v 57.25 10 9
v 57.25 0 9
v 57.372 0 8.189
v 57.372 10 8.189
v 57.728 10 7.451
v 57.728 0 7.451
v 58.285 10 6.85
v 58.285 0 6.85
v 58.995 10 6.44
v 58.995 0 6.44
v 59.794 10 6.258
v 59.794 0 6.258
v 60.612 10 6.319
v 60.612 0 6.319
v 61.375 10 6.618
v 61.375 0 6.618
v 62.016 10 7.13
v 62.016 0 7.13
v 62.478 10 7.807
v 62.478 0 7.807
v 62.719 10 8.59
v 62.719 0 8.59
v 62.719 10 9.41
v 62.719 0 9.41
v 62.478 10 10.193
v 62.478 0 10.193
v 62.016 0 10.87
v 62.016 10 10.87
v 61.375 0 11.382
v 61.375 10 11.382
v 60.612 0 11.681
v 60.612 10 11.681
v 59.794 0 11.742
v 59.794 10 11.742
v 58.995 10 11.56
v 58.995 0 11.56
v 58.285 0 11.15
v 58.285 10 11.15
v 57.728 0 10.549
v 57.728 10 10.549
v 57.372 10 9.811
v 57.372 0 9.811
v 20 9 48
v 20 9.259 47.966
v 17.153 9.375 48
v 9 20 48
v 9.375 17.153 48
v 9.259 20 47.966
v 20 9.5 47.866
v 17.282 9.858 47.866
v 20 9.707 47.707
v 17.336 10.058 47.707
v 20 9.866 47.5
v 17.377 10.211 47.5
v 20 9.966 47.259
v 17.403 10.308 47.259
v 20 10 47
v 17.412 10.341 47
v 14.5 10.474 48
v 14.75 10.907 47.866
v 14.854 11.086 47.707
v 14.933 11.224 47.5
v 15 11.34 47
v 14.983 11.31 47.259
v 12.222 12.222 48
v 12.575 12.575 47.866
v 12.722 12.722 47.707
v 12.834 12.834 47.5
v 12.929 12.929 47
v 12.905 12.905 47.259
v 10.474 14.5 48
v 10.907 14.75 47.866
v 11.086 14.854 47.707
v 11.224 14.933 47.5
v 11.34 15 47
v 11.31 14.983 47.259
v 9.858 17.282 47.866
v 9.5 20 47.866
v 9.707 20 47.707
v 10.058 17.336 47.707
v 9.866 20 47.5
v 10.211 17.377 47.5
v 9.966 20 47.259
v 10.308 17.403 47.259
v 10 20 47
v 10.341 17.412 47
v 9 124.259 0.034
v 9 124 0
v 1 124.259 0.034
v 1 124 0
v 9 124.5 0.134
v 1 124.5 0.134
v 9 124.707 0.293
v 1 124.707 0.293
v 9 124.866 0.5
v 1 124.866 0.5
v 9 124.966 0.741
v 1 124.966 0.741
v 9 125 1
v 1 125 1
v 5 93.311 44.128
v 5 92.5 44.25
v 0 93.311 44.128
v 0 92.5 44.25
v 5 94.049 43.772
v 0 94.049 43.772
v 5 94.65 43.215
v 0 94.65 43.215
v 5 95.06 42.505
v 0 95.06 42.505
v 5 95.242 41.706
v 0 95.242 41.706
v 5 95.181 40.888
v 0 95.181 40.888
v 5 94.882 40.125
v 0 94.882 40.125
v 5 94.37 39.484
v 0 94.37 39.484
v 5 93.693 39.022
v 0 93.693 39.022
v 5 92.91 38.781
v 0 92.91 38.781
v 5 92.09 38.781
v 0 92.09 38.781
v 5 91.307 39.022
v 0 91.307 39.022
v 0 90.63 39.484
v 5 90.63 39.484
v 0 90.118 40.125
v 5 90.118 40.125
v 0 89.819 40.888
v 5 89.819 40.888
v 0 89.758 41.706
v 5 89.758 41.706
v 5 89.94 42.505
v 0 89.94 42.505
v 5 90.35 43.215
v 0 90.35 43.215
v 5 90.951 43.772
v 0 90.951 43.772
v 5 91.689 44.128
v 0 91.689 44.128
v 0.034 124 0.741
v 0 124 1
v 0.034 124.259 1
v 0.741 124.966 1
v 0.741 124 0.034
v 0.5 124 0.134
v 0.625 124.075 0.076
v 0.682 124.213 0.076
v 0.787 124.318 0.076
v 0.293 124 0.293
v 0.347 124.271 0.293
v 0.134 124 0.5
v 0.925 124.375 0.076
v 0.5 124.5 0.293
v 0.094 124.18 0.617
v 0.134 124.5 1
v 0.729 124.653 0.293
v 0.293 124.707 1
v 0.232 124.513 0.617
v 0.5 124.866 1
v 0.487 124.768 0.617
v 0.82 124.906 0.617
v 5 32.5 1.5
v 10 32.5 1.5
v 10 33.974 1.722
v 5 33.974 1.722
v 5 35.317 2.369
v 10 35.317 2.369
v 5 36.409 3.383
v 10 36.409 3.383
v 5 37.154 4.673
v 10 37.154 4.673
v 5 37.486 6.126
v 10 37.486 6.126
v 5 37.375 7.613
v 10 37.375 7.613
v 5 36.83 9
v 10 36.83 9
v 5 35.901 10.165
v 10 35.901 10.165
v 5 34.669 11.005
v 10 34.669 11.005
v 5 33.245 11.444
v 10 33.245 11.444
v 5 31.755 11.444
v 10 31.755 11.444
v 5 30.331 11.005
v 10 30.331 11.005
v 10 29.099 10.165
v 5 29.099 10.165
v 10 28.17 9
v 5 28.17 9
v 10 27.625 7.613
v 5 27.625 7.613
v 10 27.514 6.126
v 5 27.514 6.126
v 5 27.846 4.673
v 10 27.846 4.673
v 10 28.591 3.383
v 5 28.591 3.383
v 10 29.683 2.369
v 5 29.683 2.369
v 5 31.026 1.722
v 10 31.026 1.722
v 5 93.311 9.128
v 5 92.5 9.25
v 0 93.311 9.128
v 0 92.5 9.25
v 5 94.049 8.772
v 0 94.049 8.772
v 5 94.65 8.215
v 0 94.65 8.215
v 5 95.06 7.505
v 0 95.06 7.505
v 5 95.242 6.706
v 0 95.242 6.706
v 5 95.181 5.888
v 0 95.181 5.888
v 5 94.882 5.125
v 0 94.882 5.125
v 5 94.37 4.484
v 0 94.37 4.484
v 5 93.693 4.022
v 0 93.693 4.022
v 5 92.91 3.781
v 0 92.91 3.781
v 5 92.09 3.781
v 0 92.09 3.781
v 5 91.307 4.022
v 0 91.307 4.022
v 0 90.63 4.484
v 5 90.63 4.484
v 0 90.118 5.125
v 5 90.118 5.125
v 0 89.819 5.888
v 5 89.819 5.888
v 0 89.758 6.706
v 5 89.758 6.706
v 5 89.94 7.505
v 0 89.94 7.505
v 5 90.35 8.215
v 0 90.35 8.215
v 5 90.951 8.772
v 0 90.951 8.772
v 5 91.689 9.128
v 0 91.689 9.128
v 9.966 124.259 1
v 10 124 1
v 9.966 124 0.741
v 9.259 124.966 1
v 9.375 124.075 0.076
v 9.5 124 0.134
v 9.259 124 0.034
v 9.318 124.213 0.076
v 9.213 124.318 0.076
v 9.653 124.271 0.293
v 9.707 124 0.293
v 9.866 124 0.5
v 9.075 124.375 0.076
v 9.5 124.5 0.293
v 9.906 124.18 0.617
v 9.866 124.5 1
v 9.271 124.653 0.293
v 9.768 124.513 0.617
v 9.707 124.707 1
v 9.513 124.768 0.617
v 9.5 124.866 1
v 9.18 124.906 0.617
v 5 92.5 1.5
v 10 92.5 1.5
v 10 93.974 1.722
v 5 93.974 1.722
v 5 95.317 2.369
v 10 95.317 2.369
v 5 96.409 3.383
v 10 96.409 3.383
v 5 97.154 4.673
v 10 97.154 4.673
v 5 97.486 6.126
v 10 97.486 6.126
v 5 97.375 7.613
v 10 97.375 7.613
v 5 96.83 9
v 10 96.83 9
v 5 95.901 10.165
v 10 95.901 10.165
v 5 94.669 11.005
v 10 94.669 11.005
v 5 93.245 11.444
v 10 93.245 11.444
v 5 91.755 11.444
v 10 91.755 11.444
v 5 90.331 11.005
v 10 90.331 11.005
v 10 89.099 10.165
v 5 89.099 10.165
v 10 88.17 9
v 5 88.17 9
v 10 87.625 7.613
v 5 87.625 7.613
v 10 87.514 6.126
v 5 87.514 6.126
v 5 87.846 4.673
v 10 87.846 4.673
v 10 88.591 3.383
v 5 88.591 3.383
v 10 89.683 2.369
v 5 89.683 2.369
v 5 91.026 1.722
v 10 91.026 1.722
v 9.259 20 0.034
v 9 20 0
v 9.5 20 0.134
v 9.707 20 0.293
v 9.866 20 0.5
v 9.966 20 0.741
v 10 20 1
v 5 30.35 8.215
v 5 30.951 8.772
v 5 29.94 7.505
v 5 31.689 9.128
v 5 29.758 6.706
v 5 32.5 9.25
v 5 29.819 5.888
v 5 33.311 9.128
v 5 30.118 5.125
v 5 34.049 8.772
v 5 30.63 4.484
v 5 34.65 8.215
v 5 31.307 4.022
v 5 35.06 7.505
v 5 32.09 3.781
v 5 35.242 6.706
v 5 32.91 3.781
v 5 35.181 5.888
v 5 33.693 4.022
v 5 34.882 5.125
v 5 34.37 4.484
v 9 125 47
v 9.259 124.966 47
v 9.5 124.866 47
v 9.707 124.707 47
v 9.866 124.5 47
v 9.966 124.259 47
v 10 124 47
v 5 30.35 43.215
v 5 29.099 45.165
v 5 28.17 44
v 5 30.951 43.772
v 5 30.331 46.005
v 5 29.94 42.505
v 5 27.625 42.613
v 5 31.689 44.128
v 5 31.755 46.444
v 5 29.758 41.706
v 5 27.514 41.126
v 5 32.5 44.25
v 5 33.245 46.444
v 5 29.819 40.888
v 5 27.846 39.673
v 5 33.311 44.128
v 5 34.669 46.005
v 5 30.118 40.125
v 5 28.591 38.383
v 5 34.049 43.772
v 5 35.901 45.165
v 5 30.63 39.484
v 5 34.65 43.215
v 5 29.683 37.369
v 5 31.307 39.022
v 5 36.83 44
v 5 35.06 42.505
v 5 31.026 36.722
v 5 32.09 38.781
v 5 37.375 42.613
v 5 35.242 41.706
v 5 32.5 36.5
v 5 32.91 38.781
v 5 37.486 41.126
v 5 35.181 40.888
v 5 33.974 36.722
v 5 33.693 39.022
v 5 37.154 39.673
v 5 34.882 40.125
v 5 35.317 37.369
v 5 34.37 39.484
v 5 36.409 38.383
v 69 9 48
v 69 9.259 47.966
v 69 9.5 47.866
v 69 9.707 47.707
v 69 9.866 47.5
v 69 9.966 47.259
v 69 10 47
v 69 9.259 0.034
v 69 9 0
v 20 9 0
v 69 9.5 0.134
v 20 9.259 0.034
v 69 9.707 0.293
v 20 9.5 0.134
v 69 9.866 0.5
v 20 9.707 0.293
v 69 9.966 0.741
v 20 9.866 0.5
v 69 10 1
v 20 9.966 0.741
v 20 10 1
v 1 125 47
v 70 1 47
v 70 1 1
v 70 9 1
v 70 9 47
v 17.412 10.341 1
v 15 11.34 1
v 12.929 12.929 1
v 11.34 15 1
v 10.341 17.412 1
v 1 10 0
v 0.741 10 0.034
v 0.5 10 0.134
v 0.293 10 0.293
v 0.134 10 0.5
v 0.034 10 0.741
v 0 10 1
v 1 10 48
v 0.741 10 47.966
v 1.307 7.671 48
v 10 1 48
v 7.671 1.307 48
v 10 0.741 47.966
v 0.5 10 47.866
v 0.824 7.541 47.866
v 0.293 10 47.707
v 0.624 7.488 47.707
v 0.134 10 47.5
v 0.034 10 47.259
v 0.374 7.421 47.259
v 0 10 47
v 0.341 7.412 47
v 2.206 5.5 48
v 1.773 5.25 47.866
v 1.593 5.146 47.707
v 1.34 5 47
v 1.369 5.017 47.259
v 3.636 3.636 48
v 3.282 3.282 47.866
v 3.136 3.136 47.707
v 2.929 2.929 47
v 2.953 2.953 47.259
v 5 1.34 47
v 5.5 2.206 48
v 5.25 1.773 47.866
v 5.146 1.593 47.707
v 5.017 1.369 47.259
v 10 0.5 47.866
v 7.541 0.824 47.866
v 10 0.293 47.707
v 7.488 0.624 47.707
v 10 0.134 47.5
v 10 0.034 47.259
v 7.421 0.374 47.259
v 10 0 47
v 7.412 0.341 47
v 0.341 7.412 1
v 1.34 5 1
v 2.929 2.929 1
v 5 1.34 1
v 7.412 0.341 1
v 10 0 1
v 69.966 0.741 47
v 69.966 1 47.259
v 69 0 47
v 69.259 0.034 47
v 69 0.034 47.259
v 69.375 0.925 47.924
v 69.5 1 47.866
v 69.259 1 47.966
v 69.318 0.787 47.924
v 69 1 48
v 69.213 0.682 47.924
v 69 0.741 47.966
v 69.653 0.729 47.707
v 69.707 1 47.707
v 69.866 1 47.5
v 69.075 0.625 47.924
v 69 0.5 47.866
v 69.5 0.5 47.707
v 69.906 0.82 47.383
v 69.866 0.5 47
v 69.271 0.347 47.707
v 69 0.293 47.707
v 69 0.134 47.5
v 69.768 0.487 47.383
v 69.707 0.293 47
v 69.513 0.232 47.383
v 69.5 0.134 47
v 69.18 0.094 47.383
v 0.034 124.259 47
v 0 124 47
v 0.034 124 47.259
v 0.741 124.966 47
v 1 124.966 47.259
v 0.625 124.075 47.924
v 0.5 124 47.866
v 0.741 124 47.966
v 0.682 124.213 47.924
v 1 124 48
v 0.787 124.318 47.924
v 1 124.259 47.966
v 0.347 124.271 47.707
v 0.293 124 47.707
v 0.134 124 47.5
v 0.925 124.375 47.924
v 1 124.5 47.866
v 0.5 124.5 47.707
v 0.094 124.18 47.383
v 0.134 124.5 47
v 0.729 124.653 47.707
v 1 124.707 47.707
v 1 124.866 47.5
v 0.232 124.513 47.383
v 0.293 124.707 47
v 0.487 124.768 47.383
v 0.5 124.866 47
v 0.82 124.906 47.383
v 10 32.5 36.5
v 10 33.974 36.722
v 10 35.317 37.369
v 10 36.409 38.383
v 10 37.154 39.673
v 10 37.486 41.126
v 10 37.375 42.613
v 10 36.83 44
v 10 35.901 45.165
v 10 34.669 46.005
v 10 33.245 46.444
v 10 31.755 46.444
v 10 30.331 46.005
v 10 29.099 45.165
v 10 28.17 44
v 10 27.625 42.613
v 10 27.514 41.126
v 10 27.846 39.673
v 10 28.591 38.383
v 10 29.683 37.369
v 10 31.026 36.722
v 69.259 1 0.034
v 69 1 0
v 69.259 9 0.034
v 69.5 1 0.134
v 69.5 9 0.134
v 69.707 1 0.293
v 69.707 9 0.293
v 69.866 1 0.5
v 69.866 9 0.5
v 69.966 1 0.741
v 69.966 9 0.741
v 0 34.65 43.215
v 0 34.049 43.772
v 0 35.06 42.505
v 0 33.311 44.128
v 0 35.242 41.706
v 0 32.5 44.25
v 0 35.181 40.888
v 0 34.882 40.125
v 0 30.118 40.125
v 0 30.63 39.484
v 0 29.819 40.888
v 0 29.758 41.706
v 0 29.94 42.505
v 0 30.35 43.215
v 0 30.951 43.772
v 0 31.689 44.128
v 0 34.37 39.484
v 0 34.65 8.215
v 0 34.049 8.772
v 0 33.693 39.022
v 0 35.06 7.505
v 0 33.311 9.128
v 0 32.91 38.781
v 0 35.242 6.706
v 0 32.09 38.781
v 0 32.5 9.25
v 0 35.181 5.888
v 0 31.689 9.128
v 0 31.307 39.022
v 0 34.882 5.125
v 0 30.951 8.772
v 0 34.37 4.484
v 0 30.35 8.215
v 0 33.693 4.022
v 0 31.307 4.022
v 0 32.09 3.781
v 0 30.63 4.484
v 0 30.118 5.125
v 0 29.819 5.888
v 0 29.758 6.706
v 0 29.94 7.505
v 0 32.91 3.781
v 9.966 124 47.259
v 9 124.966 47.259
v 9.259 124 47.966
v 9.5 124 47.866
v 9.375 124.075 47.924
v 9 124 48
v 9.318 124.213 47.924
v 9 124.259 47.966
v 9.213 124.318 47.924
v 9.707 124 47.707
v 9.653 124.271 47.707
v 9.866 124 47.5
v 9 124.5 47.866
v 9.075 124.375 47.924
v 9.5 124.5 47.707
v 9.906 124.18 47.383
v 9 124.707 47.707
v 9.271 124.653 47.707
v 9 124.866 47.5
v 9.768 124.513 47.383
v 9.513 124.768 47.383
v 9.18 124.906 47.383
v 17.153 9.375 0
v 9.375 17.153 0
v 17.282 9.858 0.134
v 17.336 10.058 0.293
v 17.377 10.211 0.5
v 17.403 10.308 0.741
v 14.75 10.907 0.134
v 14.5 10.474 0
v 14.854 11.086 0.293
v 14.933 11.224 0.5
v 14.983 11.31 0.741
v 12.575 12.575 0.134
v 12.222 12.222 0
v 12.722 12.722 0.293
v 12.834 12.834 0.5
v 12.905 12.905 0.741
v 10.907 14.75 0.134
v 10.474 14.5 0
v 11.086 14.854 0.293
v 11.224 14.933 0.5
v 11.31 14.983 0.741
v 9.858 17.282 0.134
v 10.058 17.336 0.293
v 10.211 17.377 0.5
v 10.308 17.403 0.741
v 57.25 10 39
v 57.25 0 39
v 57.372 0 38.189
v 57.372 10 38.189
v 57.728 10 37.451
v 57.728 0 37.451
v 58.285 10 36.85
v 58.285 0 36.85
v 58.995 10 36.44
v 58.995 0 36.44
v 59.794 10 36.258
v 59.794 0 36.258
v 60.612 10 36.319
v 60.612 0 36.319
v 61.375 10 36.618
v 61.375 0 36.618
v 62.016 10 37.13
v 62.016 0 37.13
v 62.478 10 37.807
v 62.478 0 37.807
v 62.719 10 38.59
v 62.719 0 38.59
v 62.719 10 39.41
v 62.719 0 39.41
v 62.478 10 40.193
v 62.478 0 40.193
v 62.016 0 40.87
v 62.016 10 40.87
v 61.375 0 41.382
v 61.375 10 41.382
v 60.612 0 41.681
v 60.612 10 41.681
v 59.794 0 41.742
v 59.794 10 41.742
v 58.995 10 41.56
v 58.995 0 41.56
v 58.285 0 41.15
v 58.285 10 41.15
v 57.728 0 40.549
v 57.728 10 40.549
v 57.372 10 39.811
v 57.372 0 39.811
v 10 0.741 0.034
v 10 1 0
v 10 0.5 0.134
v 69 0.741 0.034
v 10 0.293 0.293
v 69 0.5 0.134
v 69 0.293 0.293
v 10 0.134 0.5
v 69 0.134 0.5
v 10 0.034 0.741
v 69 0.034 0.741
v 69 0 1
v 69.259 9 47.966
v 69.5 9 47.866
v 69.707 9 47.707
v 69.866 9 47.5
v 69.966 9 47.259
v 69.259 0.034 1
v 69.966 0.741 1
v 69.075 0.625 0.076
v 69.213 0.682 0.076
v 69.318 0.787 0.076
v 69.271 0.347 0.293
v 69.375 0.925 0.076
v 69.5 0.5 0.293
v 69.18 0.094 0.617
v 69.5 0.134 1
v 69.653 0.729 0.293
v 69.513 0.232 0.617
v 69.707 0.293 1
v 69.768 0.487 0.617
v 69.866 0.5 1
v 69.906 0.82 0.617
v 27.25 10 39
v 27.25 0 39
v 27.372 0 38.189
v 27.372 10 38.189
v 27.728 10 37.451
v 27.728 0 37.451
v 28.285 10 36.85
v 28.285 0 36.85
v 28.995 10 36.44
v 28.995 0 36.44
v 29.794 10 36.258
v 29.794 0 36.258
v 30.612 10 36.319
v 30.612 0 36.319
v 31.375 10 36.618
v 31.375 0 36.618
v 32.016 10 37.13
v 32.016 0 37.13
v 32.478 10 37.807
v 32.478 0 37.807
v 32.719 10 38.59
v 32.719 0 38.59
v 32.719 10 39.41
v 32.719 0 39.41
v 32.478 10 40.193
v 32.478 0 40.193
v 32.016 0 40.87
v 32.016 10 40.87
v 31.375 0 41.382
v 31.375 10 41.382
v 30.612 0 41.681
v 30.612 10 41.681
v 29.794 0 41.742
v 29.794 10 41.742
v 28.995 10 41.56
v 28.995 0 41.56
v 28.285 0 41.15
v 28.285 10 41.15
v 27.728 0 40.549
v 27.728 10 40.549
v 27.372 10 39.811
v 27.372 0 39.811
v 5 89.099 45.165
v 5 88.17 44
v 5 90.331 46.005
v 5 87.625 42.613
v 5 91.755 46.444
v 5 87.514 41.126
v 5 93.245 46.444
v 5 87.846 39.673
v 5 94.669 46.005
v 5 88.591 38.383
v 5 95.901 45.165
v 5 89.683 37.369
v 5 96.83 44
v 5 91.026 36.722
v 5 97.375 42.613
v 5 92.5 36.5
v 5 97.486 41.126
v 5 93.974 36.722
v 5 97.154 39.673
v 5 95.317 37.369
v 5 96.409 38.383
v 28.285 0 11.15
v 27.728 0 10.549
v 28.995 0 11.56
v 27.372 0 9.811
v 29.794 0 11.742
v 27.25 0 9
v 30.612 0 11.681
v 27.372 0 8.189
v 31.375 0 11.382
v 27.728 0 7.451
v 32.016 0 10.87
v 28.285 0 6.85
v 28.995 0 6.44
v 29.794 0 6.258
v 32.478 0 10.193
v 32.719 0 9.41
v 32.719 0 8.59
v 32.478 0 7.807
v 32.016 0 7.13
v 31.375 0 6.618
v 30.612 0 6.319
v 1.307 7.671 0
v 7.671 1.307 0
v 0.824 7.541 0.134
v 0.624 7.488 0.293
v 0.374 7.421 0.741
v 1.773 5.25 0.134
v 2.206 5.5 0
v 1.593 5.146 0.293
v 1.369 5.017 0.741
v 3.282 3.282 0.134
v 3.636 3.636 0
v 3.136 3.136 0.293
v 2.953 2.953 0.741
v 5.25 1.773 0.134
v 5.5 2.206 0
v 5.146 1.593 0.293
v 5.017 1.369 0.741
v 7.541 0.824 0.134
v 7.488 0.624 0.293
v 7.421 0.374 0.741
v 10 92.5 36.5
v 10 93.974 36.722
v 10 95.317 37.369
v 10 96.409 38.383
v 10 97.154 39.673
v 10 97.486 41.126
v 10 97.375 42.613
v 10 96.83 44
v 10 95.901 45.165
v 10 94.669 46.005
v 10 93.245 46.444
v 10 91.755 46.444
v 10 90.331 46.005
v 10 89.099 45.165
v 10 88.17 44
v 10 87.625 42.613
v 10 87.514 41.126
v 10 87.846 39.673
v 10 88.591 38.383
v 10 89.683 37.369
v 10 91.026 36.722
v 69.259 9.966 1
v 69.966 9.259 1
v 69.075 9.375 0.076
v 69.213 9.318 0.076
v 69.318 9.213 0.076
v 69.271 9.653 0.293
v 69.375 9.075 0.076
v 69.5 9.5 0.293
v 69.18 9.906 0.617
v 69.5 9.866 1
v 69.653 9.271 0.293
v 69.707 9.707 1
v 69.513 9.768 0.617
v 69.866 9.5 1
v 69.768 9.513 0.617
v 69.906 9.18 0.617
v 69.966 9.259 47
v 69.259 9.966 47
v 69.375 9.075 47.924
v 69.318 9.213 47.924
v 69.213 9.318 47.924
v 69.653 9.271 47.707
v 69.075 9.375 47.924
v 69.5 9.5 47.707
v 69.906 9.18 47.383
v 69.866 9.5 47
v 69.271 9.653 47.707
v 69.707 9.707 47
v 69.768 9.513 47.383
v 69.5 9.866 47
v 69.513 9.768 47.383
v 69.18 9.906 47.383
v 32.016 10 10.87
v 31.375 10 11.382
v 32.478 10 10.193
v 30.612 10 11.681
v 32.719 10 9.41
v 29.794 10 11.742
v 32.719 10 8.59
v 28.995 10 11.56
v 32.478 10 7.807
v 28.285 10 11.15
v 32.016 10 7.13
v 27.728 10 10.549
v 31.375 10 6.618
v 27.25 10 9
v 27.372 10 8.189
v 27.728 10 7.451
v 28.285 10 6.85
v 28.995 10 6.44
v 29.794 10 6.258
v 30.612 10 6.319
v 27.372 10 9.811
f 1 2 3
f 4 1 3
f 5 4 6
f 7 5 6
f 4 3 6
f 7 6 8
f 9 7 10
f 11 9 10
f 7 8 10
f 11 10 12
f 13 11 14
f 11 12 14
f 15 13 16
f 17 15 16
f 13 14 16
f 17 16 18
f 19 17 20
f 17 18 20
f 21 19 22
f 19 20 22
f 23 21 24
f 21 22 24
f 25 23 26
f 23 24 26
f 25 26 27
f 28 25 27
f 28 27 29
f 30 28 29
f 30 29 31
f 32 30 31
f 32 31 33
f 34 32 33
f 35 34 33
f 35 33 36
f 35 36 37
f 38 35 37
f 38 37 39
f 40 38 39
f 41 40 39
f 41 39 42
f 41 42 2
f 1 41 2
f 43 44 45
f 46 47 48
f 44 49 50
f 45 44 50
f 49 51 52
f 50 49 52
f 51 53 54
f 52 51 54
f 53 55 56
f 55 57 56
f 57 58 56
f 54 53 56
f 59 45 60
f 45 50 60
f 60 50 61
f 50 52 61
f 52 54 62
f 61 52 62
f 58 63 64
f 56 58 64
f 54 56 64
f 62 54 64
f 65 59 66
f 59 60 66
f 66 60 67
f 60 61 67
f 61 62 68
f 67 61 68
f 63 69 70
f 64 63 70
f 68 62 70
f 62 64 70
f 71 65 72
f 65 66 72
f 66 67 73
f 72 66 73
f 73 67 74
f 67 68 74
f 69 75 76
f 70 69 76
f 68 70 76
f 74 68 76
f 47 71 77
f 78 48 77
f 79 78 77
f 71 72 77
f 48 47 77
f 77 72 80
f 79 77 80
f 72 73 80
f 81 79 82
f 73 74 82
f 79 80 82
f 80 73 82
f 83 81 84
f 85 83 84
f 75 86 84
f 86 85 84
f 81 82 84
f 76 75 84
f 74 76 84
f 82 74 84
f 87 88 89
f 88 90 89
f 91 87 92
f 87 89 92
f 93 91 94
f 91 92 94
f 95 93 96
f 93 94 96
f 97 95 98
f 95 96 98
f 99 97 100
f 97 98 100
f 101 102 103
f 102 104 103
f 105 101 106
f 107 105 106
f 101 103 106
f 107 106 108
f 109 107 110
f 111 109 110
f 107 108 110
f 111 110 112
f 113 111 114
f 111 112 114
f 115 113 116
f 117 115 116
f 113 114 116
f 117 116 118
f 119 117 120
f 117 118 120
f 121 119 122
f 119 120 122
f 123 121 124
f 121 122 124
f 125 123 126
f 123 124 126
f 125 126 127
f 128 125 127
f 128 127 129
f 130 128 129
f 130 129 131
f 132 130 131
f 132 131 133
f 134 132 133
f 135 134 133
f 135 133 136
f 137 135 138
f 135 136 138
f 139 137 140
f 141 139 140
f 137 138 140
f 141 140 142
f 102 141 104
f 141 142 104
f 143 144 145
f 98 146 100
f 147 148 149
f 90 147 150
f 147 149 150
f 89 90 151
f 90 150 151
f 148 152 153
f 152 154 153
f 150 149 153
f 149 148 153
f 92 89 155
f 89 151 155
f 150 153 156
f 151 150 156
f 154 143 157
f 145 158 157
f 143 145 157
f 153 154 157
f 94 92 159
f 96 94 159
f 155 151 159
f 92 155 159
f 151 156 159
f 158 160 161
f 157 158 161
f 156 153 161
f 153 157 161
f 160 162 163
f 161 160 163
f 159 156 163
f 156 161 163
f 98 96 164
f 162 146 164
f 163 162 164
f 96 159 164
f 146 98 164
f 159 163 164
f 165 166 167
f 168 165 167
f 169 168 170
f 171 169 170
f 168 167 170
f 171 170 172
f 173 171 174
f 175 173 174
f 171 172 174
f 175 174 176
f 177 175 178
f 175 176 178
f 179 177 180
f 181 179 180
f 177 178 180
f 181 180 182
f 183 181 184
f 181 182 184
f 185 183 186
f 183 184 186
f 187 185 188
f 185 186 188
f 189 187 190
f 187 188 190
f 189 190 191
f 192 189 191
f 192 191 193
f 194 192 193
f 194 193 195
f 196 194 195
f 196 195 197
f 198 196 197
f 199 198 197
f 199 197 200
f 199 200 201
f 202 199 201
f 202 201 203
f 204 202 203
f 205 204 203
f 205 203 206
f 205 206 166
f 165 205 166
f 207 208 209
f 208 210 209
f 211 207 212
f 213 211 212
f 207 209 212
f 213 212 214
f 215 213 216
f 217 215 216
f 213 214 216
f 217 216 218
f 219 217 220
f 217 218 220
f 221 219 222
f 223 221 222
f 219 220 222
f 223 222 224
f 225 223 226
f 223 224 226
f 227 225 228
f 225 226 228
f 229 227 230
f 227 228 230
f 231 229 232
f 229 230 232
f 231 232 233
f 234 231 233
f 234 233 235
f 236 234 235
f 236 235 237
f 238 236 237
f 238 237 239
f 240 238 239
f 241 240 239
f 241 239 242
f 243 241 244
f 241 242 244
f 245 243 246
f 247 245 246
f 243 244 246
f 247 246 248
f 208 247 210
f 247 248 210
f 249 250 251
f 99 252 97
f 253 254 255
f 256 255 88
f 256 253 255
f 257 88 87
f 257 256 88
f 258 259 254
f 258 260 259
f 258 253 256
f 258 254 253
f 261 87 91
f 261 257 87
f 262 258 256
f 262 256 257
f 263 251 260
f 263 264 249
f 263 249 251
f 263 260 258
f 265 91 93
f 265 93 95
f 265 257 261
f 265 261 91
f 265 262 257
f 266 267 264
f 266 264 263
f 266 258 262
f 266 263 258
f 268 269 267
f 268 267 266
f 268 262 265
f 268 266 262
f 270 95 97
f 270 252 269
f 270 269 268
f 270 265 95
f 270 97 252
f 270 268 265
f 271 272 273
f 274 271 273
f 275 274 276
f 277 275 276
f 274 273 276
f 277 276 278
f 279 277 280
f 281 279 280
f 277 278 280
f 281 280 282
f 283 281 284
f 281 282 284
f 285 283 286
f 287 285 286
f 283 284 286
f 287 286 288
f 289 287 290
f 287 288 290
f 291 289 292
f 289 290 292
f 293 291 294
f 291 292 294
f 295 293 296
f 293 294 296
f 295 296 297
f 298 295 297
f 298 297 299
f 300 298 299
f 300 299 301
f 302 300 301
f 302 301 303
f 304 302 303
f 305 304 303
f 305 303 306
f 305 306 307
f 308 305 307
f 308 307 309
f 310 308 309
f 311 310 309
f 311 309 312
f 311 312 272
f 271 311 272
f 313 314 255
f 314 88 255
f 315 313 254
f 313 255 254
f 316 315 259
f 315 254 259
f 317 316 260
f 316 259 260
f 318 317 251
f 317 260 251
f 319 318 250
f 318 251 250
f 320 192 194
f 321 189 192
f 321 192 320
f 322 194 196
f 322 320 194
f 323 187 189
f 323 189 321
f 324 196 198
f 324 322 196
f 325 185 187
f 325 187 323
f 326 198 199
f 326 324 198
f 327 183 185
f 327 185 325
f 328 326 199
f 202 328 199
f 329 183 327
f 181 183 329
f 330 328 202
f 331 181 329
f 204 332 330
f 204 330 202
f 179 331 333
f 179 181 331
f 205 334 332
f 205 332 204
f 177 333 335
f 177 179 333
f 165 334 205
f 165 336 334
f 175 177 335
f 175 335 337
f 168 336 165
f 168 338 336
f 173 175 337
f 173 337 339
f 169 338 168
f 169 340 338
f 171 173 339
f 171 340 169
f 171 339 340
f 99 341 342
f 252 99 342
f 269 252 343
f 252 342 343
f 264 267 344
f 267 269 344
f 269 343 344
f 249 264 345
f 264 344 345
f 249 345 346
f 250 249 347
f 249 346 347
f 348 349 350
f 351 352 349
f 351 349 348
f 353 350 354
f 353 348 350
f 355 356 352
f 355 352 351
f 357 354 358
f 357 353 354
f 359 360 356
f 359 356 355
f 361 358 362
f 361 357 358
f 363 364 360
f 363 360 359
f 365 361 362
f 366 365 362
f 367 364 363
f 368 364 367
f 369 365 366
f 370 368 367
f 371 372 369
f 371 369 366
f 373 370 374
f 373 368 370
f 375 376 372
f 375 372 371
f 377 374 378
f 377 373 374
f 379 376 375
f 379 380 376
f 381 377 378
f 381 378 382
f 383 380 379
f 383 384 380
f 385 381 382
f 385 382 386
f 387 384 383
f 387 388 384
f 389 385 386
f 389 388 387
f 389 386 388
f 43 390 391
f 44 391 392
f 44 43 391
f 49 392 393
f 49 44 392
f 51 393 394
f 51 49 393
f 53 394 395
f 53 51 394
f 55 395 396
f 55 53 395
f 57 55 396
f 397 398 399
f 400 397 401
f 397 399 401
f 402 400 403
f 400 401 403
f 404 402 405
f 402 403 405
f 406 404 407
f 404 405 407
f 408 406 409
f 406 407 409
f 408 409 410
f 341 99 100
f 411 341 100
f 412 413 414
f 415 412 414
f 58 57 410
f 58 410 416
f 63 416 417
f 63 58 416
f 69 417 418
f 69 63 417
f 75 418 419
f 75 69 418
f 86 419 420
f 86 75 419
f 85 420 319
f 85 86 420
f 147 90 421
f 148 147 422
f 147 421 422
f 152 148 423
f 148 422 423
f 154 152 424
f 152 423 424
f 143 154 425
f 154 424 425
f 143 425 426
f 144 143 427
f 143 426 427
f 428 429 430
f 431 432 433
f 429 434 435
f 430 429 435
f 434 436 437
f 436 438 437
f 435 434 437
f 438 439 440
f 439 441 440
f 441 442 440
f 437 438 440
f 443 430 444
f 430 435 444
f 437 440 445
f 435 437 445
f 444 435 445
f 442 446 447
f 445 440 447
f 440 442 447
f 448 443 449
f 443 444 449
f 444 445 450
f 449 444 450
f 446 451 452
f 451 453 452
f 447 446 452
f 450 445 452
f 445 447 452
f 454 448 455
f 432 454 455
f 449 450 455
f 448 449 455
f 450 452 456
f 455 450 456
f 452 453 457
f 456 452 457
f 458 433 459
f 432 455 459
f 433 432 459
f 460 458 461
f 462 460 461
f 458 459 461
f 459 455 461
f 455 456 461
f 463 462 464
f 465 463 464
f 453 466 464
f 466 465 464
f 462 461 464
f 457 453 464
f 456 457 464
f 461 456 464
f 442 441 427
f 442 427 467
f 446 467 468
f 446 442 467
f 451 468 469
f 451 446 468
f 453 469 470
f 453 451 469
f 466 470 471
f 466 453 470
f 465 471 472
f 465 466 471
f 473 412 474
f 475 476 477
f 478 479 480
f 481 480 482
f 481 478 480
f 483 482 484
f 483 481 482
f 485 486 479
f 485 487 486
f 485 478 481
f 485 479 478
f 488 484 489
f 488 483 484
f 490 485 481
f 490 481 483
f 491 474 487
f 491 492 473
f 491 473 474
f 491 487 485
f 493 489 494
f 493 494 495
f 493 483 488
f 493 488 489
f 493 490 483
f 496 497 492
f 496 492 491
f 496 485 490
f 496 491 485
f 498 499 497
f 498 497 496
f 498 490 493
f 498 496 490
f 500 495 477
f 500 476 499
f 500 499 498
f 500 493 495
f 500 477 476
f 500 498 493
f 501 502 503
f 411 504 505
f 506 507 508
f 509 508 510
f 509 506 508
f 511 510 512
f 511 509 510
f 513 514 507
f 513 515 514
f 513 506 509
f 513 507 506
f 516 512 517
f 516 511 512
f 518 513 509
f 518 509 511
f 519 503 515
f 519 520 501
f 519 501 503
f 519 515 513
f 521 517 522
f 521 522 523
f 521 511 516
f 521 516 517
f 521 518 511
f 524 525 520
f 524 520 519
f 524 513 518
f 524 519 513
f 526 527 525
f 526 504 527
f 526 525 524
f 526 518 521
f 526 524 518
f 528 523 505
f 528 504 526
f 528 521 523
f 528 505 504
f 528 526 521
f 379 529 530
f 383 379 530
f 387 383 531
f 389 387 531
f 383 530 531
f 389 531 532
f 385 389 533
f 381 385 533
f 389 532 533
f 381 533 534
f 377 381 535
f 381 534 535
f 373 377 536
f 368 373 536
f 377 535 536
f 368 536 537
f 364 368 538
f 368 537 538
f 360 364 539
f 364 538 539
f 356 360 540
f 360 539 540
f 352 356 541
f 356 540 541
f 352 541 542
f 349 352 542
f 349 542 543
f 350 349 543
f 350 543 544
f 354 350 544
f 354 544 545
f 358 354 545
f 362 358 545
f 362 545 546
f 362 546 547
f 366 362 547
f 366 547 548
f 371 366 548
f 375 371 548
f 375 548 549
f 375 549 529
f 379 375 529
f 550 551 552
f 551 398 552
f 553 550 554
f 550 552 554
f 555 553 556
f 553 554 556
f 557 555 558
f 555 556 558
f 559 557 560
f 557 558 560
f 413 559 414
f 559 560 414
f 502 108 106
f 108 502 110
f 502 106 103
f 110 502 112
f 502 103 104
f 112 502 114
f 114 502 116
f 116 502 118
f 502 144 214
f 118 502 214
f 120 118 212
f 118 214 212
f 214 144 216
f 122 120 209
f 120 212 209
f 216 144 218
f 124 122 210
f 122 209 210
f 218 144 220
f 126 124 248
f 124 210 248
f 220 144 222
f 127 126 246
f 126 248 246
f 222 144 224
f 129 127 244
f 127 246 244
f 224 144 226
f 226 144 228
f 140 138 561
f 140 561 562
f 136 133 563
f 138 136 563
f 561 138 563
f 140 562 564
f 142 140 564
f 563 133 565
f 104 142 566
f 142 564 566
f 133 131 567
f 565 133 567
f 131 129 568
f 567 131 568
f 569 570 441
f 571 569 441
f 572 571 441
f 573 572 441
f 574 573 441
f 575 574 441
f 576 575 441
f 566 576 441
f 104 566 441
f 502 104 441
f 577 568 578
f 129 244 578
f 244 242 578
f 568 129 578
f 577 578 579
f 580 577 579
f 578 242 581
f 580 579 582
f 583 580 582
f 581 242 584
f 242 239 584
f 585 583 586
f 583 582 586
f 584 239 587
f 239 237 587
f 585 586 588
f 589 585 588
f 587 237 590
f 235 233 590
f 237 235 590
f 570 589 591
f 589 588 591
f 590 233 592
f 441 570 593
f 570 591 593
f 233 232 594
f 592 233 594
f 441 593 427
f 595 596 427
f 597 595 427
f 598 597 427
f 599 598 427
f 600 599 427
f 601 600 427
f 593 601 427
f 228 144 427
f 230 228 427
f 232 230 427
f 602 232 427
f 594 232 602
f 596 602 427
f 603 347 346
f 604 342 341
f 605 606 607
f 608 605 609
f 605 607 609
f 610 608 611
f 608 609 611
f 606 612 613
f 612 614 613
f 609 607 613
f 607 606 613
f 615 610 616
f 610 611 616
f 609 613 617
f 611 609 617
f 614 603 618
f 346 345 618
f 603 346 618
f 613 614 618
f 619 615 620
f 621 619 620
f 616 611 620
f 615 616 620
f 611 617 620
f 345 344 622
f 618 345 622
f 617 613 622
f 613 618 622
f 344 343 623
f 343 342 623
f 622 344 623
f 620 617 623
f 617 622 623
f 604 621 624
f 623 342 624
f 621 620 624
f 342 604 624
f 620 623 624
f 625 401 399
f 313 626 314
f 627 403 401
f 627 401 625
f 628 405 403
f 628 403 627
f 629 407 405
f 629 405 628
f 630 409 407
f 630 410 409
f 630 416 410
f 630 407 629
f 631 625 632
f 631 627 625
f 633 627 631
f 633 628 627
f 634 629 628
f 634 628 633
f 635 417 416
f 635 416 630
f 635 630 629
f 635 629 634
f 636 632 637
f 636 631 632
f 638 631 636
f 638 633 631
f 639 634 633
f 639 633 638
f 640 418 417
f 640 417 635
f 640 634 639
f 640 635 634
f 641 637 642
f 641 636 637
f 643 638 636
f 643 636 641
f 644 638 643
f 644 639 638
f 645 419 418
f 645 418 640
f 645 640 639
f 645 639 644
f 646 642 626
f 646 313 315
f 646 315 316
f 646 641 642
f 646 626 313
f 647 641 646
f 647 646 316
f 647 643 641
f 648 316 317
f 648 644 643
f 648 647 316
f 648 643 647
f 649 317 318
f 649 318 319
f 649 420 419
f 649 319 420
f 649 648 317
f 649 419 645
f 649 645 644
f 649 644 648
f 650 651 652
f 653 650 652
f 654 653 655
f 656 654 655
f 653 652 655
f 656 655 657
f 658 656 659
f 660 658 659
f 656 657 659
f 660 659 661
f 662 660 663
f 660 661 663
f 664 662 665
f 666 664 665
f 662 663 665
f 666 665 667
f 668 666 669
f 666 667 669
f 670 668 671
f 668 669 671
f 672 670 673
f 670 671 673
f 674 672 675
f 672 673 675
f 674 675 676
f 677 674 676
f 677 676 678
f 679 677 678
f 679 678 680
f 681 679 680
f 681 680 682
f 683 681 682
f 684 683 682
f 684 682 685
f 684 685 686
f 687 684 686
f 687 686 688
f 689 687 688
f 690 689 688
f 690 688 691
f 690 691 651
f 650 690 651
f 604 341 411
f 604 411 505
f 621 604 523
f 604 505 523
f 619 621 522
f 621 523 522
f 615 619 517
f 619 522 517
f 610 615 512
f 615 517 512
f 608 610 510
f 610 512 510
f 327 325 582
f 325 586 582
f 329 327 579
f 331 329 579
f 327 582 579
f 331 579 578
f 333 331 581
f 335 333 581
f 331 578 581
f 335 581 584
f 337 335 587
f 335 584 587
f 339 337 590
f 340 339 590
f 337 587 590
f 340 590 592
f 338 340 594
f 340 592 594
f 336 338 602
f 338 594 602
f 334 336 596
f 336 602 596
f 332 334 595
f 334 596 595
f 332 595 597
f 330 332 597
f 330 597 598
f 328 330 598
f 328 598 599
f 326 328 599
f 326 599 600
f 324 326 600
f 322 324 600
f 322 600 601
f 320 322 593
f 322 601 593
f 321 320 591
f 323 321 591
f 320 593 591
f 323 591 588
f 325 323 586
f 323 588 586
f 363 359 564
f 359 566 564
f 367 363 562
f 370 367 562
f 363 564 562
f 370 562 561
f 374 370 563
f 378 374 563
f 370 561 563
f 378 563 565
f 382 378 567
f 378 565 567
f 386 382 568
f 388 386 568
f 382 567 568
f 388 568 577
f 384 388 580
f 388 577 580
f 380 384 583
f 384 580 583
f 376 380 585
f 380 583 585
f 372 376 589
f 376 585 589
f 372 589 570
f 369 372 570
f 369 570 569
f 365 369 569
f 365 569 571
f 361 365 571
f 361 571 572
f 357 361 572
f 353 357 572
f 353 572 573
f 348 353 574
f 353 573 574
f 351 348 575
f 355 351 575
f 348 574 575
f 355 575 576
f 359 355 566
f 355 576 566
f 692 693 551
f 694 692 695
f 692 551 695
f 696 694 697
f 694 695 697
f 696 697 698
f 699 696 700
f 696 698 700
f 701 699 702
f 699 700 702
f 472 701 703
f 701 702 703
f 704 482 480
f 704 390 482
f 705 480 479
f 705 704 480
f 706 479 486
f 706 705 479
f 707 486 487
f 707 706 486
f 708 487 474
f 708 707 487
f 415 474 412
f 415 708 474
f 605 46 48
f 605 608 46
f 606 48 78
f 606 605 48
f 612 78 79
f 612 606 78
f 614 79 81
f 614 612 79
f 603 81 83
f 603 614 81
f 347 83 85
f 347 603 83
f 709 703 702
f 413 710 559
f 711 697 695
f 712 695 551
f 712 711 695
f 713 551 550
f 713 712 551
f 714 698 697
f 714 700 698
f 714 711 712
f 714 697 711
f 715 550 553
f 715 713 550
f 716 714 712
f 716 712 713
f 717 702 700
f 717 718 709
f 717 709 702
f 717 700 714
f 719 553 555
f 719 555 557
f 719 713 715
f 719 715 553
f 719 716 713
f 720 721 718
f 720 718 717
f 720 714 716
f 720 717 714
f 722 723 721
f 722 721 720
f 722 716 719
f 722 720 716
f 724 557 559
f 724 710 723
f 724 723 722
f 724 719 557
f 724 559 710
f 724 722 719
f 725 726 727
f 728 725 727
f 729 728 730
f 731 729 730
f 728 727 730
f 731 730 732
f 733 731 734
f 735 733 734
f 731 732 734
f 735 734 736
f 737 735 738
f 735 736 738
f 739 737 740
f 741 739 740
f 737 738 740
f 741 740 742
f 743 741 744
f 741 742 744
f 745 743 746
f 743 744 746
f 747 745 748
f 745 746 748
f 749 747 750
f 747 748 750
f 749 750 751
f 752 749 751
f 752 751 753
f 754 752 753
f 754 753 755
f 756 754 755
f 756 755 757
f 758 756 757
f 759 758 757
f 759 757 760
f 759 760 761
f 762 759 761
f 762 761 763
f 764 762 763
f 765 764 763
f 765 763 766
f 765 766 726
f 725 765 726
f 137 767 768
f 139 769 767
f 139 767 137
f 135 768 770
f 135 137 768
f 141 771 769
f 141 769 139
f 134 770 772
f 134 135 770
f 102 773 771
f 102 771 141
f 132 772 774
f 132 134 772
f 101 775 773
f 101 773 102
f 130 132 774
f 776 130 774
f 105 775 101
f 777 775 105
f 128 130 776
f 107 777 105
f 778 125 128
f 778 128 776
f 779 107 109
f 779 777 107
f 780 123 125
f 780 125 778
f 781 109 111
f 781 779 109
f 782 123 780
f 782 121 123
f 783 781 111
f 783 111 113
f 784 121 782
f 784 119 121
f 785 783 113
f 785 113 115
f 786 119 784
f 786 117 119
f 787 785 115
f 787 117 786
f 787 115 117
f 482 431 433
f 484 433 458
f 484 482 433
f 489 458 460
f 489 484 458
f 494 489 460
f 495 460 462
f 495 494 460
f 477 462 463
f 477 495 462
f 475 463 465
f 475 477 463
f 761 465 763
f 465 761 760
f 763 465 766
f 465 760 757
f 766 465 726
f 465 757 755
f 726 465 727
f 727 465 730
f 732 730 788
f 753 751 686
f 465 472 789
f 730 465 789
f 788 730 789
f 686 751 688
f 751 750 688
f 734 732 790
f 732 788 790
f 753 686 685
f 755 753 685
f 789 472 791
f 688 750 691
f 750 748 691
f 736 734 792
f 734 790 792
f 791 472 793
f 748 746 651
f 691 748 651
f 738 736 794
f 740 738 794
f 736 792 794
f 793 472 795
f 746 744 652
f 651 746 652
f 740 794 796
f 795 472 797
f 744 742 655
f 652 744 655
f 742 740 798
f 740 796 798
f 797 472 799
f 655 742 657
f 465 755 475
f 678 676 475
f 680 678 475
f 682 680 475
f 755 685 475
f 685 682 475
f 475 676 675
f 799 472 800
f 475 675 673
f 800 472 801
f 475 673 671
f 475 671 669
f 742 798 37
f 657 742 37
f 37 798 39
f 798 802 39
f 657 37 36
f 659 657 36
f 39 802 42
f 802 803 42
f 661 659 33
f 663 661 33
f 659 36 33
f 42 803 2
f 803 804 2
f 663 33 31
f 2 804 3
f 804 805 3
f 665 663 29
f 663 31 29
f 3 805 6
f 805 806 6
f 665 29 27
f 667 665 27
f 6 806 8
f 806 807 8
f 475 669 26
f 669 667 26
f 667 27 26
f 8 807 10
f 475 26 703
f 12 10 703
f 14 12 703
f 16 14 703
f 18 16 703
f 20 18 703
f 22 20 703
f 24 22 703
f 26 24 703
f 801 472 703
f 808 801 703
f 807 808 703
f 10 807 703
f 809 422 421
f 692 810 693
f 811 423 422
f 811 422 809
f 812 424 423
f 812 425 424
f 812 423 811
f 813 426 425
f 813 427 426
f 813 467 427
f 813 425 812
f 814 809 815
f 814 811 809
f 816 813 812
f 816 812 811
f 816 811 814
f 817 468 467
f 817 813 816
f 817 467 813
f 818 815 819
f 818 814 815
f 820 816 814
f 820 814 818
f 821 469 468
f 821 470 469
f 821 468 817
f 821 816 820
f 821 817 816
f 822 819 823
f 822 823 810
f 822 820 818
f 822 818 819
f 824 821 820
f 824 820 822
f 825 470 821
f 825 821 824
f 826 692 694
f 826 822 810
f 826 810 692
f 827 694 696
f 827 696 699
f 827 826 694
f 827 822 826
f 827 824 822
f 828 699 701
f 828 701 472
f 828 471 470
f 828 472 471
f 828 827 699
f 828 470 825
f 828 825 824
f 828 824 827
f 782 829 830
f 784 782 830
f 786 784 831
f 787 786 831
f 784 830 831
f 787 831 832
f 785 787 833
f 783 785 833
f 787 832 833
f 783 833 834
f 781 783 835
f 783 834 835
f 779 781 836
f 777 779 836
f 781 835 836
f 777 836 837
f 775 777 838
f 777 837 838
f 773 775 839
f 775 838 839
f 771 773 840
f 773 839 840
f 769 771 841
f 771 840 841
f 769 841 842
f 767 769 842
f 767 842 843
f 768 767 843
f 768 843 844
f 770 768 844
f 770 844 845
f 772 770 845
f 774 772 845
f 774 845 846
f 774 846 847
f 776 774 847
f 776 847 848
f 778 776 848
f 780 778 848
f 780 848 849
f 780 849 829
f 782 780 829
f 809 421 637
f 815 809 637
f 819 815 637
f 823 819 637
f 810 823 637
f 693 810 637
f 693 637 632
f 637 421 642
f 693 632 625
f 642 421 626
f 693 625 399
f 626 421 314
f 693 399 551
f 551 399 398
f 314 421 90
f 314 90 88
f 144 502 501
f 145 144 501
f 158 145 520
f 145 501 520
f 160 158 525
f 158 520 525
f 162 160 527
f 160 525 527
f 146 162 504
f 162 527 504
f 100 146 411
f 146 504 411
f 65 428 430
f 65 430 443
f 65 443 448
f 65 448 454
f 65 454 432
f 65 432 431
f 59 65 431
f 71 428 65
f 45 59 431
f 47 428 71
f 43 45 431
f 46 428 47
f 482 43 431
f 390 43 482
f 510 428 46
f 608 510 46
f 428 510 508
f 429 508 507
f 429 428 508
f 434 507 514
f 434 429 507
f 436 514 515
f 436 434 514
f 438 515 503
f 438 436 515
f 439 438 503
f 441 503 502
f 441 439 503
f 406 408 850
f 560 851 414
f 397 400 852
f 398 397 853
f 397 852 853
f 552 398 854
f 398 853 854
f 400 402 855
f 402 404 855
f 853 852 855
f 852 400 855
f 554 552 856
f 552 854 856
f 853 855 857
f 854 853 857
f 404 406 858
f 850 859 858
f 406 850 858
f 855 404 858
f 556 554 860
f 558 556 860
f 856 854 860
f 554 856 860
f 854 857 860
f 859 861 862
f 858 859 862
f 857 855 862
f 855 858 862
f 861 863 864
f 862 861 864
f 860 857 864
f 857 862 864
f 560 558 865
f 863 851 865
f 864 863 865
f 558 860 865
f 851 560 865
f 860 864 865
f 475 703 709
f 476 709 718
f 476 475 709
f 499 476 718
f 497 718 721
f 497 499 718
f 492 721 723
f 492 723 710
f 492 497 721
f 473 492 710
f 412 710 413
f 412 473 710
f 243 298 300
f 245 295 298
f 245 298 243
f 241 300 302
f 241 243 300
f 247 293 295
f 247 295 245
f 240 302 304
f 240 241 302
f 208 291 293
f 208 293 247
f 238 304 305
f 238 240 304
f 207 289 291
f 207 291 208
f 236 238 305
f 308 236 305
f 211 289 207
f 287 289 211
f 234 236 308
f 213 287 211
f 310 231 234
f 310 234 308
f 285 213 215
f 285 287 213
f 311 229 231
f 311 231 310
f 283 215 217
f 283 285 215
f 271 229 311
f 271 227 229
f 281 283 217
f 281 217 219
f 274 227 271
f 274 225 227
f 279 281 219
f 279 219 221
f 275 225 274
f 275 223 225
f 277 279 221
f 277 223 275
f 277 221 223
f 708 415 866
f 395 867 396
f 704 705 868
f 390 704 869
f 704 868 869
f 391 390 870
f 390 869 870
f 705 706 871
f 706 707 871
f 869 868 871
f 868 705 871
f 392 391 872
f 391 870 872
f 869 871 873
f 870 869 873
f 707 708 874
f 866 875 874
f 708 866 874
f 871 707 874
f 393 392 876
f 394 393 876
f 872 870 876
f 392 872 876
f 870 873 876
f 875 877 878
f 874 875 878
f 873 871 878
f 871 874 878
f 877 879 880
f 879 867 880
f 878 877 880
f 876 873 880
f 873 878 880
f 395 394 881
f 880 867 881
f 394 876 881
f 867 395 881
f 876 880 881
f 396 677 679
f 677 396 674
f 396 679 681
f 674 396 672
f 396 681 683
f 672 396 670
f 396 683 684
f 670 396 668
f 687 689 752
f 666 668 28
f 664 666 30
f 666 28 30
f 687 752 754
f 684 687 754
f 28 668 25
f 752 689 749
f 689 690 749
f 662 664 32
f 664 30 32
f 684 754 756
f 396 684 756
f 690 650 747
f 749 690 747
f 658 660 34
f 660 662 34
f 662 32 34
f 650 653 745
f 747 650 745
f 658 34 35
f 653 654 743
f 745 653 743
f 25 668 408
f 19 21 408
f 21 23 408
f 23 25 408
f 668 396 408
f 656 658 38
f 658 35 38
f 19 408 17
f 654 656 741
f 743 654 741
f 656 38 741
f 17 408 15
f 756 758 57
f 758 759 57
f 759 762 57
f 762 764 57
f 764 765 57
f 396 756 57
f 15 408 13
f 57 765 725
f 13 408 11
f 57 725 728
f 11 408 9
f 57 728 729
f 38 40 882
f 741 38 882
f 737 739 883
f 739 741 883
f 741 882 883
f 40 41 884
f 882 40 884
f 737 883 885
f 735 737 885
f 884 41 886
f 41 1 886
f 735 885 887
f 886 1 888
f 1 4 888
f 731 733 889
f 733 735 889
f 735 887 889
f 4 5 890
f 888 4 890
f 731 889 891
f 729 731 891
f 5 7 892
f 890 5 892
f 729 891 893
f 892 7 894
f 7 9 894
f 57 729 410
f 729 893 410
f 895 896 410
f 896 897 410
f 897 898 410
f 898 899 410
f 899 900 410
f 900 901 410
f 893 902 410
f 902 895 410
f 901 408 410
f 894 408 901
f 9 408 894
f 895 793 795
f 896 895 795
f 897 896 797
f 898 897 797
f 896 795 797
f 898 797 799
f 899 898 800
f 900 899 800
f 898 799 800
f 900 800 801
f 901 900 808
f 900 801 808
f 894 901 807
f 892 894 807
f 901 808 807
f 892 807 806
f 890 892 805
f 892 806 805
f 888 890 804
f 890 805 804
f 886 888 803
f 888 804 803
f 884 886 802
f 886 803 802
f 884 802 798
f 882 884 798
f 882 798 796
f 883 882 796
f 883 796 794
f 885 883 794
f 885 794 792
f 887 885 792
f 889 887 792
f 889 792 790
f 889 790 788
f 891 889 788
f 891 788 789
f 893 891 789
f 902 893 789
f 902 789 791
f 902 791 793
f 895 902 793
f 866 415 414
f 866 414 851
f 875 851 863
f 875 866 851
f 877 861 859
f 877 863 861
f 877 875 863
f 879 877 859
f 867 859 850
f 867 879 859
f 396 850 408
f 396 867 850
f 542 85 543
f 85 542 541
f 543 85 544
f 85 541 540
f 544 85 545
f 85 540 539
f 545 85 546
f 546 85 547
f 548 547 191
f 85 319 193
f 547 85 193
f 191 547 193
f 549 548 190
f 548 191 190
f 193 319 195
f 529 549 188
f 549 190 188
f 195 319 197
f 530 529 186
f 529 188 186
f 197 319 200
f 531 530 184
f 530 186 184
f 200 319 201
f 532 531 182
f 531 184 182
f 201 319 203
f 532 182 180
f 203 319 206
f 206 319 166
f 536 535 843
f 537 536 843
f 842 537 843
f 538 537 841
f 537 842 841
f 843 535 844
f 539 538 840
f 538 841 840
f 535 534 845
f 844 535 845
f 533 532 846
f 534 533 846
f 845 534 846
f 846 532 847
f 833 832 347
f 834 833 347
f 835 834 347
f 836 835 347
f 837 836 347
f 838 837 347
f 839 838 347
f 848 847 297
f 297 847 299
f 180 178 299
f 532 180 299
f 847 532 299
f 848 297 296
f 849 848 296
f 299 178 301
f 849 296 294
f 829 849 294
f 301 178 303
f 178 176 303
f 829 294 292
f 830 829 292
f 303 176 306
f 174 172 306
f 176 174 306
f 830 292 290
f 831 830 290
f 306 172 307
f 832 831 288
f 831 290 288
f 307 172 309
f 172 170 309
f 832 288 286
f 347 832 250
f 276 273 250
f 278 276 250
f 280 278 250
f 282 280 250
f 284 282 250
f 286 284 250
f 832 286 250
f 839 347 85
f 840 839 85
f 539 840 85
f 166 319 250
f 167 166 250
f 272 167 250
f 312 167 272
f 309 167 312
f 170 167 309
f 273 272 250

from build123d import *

# Parameters (mm, degrees)
BASE_DEPTH                           = 48
ROOT_EDGE_FILLET_R                   = 10
SLIDER_BOLT_HOLE_PATTERN_D           = 5.5
SLIDER_BOLT_HOLE_PATTERN_CBORE_D     = 10
SLIDER_BOLT_HOLE_PATTERN_CBORE_DEPTH = 5
DESKTOP_BOLT_HOLE_PATTERN_D          = 5.5
EXTERNAL_FILLET_R                    = 1


with BuildPart() as part:
    # Sketch1 → base (new body)
    with BuildSketch(Plane.XY):
        Polygon((0, 125), (0, 0), (70, 0), (70, 10), (10, 10), (10, 125), align=None)
    extrude(amount=BASE_DEPTH)

    # root_edge_fillet
    root_edge_fillet_edges = [part.edges().sort_by_distance(p)[0] for p in [
        (10, 10, 24),
        (0, 0, 24),
    ]]
    fillet(root_edge_fillet_edges, radius=ROOT_EDGE_FILLET_R)

    # slider_bolt_hole_pattern (through all)
    with Locations(Plane(origin=(10, 0, 0), x_dir=(0, 0, -1), z_dir=(1, 0, 0))):
        with Locations((-41.5, 92.5), (-6.5, 32.5), (-41.5, 32.5), (-6.5, 92.5)):
            CounterBoreHole(SLIDER_BOLT_HOLE_PATTERN_D / 2, SLIDER_BOLT_HOLE_PATTERN_CBORE_D / 2, SLIDER_BOLT_HOLE_PATTERN_CBORE_DEPTH)

    # desktop_bolt_hole_pattern (through all)
    with Locations(Plane(origin=(0, 10, 0), x_dir=(1, 0, 0), z_dir=(0, 1, 0))):
        with Locations((30, -9), (60, -39), (30, -39), (60, -9)):
            Hole(DESKTOP_BOLT_HOLE_PATTERN_D / 2)

    # external_fillet
    external_fillet_edges = [part.edges().sort_by_distance(p)[0] for p in [
        (10, 125, 24),
        (70, 10, 24),
        (70, 0, 24),
        (0, 125, 24),
        (70, 5, 48),
        (45, 10, 48),
        (40, 0, 0),
        (40, 0, 48),
        (10, 72.5, 0),
        (2.928932188, 2.928932188, 0),
        (10, 72.5, 48),
        (2.928932188, 2.928932188, 48),
        (12.928932188, 12.928932188, 0),
        (12.928932188, 12.928932188, 48),
        (5, 125, 48),
        (45, 10, 0),
        (70, 5, 0),
        (0, 67.5, 48),
        (0, 67.5, 0),
        (5, 125, 0),
    ]]
    fillet(external_fillet_edges, radius=EXTERNAL_FILLET_R)


solid = part.part
